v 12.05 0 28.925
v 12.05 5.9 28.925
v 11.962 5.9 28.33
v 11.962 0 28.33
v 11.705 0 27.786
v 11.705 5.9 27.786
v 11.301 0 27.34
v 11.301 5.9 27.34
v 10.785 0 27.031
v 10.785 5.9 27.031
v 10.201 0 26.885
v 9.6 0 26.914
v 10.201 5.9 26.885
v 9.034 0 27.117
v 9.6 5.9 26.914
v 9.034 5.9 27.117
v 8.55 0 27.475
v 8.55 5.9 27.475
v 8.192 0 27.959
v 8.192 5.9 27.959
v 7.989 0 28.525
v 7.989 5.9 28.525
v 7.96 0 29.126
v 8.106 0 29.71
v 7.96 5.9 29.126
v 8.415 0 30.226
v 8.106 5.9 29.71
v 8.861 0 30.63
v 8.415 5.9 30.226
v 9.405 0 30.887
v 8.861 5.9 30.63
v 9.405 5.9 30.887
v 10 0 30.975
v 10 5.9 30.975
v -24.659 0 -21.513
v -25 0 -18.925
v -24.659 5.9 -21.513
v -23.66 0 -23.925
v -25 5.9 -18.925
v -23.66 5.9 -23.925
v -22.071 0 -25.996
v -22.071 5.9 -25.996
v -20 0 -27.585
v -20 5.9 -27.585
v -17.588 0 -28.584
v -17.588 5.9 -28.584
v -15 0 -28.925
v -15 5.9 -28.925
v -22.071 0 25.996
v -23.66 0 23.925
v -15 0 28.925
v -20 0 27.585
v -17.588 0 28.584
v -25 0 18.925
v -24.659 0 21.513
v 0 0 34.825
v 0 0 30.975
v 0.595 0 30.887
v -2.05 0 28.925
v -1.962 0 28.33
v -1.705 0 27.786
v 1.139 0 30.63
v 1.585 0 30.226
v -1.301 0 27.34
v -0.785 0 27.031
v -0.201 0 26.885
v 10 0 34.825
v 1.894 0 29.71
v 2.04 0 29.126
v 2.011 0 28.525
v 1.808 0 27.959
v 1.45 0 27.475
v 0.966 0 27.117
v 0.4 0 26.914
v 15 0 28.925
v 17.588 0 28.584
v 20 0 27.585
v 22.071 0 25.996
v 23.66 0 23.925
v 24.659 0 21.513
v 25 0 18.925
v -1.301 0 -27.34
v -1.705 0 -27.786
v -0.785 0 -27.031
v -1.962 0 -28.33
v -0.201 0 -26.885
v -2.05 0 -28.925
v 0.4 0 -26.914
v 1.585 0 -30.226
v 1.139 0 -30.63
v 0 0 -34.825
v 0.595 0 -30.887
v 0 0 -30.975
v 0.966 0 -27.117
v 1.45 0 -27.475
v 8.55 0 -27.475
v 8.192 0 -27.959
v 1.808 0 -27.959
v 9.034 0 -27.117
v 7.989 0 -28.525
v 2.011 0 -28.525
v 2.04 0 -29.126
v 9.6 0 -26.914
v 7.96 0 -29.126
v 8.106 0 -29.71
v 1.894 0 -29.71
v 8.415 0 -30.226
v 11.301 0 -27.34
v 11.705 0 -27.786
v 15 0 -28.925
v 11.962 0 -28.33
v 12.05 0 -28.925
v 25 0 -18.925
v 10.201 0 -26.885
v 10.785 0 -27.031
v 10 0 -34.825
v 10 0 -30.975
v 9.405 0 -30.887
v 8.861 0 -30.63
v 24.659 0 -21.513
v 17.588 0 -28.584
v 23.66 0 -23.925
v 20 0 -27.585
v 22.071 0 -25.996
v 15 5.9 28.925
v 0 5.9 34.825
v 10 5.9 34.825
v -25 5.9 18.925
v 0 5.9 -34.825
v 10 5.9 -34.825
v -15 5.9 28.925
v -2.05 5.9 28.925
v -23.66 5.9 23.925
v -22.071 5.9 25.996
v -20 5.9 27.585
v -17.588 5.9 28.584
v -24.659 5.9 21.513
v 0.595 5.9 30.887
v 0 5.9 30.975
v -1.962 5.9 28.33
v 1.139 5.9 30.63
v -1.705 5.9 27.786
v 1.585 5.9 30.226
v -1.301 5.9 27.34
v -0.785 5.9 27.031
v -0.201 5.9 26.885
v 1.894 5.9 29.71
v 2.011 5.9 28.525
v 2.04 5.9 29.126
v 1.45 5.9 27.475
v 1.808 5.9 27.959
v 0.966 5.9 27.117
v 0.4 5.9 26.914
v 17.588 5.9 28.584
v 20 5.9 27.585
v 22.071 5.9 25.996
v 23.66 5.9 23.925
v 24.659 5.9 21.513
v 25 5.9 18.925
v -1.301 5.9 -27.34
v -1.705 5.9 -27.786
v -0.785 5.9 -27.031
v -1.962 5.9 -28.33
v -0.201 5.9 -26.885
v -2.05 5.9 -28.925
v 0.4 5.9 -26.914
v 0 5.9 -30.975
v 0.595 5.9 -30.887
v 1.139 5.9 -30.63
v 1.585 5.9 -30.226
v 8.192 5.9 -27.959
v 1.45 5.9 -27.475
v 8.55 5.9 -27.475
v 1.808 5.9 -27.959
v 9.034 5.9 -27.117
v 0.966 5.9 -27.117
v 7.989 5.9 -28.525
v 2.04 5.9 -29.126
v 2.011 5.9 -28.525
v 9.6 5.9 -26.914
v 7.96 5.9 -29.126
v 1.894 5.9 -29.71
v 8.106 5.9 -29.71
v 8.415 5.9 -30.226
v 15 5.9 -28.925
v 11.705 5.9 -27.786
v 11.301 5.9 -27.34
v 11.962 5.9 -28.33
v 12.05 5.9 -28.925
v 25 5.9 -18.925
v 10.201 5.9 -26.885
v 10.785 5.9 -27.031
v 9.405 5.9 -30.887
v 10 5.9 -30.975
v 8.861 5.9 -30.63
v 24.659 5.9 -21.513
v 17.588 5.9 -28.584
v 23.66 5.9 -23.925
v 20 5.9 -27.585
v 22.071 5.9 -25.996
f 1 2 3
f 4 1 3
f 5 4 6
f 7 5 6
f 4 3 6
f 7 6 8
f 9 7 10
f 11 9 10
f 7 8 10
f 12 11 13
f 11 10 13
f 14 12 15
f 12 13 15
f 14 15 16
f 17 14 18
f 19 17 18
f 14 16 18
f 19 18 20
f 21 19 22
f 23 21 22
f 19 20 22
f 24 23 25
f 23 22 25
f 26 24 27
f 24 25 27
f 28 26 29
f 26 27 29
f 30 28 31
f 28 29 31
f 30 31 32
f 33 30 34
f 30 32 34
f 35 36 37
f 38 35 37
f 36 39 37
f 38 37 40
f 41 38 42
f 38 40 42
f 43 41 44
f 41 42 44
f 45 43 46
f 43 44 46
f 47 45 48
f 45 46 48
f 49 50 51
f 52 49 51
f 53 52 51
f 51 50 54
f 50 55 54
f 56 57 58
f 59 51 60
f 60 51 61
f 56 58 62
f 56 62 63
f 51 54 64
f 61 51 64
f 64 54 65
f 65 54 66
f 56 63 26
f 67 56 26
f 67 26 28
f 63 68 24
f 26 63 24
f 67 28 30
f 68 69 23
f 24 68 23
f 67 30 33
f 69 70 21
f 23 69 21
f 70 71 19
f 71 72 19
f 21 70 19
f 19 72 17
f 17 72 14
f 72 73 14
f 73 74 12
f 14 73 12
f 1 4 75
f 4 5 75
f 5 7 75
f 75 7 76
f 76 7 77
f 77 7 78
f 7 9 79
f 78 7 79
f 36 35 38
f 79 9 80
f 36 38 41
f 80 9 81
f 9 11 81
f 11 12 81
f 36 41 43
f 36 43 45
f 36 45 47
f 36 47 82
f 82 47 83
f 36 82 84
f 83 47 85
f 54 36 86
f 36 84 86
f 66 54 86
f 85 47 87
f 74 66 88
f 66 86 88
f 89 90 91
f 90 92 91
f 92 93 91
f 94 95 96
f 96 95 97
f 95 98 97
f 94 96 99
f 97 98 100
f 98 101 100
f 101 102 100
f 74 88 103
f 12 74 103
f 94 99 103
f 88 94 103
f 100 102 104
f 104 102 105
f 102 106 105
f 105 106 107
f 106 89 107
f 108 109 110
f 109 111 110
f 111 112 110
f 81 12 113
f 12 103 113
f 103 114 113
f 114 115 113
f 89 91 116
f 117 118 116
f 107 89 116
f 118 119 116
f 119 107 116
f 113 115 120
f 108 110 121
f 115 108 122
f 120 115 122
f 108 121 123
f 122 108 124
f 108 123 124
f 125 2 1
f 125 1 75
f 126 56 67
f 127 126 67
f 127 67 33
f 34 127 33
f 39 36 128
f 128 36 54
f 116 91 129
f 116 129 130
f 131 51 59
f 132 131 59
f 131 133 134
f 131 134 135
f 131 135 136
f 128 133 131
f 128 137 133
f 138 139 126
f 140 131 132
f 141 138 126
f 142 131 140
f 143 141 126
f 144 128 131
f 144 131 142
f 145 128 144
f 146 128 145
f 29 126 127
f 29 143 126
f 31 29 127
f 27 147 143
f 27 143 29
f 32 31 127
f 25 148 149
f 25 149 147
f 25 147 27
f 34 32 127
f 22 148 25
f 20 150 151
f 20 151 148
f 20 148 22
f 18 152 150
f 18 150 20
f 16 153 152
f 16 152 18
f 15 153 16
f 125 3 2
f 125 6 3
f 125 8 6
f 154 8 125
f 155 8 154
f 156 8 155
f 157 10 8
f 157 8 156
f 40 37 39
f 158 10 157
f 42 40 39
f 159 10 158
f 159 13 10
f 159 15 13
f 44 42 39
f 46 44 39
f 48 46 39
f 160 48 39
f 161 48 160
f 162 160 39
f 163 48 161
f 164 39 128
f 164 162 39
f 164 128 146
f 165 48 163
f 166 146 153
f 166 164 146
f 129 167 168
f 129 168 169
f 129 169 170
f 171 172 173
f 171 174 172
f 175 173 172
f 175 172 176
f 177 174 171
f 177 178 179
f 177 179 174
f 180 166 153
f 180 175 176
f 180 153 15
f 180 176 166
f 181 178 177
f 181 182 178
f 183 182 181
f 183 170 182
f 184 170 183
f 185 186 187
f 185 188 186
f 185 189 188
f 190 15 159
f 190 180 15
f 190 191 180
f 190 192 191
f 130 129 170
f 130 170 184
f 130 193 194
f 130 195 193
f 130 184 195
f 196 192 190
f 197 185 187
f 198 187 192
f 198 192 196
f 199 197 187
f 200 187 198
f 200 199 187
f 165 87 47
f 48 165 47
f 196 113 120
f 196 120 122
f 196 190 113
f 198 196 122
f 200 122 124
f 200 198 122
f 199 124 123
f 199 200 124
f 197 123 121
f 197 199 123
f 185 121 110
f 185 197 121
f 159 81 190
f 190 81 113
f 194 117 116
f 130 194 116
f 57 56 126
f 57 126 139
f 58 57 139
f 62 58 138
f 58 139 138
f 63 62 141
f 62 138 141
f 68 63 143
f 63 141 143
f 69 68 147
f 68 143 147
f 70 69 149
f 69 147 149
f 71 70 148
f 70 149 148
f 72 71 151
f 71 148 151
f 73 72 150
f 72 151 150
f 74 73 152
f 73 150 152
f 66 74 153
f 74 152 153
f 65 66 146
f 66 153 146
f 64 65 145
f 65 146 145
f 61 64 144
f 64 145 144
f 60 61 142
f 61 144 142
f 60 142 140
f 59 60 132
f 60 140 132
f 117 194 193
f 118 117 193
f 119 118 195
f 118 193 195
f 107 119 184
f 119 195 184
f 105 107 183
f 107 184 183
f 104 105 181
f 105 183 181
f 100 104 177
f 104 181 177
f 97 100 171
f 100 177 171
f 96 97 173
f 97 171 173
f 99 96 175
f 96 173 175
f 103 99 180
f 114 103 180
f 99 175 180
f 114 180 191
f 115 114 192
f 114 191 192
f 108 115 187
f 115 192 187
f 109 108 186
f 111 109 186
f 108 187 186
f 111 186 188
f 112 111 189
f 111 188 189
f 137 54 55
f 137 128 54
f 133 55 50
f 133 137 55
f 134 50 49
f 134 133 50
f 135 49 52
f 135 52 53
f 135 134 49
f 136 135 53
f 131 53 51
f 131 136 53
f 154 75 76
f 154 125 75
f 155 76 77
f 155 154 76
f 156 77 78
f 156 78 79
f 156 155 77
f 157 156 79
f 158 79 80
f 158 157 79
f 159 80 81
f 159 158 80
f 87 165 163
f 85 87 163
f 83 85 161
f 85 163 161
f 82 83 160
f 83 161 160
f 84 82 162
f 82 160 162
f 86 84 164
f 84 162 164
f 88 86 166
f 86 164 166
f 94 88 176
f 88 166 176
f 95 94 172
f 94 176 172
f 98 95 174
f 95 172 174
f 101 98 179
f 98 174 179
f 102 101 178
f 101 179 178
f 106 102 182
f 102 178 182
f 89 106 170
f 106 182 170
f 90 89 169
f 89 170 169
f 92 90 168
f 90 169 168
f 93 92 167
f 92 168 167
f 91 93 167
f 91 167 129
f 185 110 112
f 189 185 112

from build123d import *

# Parameters (mm, degrees)
SKETCH1_W           = 10
SKETCH1_H           = 5.9
BOSS_EXTRUDE1_DEPTH = 5.9
FILLET1_R           = 10
CUT_EXTRUDE1_REACH  = 7.9
SKETCH2_R           = 2.05


with BuildPart() as part:
    # Sketch1 → Boss-Extrude1 (new body)
    with BuildSketch(Plane(origin=(0, 0, 0), x_dir=(1, 0, 0), z_dir=(0, 1, 0))):
        Polygon((-25, 28.925), (-25, -28.925), (0, -28.925), (0, -23.025), (10, -23.025), (10, -28.925), (25, -28.925), (25, 28.925), (10, 28.925), (10, 23.025), (0, 23.025), (0, 28.925), align=None)
        with Locations((5, -25.975)):
            Rectangle(SKETCH1_W, SKETCH1_H)
        with Locations((5, -31.875)):
            Rectangle(SKETCH1_W, SKETCH1_H)
        with Locations((5, 25.975)):
            Rectangle(SKETCH1_W, SKETCH1_H)
        with Locations((5, 31.875)):
            Rectangle(SKETCH1_W, SKETCH1_H)
    extrude(amount=BOSS_EXTRUDE1_DEPTH)

    # Fillet1
    fillet1_edges = [part.edges().sort_by_distance(p)[0] for p in [
        (25, 2.95, -28.925),
        (25, 2.95, 28.925),
        (-25, 2.95, 28.925),
        (-25, 2.95, -28.925),
    ]]
    fillet(fillet1_edges, radius=FILLET1_R)

    # Sketch2 → Cut-Extrude1 (cut, up to next)
    with BuildSketch(Plane(origin=(0, 5.9, 0), x_dir=(1, 0, 0), z_dir=(0, 1, 0)), mode=Mode.PRIVATE) as cut_extrude1_sk1:
        with Locations((0, 28.925)):
            Circle(SKETCH2_R)
    cut_extrude1_tool1 = extrude(cut_extrude1_sk1.sketch, amount=-CUT_EXTRUDE1_REACH, mode=Mode.PRIVATE) & part.part
    add(cut_extrude1_tool1.solids().sort_by_distance((0, 5.9, -28.925))[0], mode=Mode.SUBTRACT)
    # Sketch2 → Cut-Extrude1 (cut, up to next)
    with BuildSketch(Plane(origin=(0, 5.9, 0), x_dir=(1, 0, 0), z_dir=(0, 1, 0)), mode=Mode.PRIVATE) as cut_extrude1_sk2:
        with Locations((10, 28.925)):
            Circle(SKETCH2_R)
    cut_extrude1_tool2 = extrude(cut_extrude1_sk2.sketch, amount=-CUT_EXTRUDE1_REACH, mode=Mode.PRIVATE) & part.part
    add(cut_extrude1_tool2.solids().sort_by_distance((10, 5.9, -28.925))[0], mode=Mode.SUBTRACT)
    # Sketch2 → Cut-Extrude1 (cut, up to next)
    with BuildSketch(Plane(origin=(0, 5.9, 0), x_dir=(1, 0, 0), z_dir=(0, 1, 0)), mode=Mode.PRIVATE) as cut_extrude1_sk3:
        with Locations((0, -28.925)):
            Circle(SKETCH2_R)
    cut_extrude1_tool3 = extrude(cut_extrude1_sk3.sketch, amount=-CUT_EXTRUDE1_REACH, mode=Mode.PRIVATE) & part.part
    add(cut_extrude1_tool3.solids().sort_by_distance((0, 5.9, 28.925))[0], mode=Mode.SUBTRACT)
    # Sketch2 → Cut-Extrude1 (cut, up to next)
    with BuildSketch(Plane(origin=(0, 5.9, 0), x_dir=(1, 0, 0), z_dir=(0, 1, 0)), mode=Mode.PRIVATE) as cut_extrude1_sk4:
        with Locations((10, -28.925)):
            Circle(SKETCH2_R)
    cut_extrude1_tool4 = extrude(cut_extrude1_sk4.sketch, amount=-CUT_EXTRUDE1_REACH, mode=Mode.PRIVATE) & part.part
    add(cut_extrude1_tool4.solids().sort_by_distance((10, 5.9, 28.925))[0], mode=Mode.SUBTRACT)


solid = part.part
